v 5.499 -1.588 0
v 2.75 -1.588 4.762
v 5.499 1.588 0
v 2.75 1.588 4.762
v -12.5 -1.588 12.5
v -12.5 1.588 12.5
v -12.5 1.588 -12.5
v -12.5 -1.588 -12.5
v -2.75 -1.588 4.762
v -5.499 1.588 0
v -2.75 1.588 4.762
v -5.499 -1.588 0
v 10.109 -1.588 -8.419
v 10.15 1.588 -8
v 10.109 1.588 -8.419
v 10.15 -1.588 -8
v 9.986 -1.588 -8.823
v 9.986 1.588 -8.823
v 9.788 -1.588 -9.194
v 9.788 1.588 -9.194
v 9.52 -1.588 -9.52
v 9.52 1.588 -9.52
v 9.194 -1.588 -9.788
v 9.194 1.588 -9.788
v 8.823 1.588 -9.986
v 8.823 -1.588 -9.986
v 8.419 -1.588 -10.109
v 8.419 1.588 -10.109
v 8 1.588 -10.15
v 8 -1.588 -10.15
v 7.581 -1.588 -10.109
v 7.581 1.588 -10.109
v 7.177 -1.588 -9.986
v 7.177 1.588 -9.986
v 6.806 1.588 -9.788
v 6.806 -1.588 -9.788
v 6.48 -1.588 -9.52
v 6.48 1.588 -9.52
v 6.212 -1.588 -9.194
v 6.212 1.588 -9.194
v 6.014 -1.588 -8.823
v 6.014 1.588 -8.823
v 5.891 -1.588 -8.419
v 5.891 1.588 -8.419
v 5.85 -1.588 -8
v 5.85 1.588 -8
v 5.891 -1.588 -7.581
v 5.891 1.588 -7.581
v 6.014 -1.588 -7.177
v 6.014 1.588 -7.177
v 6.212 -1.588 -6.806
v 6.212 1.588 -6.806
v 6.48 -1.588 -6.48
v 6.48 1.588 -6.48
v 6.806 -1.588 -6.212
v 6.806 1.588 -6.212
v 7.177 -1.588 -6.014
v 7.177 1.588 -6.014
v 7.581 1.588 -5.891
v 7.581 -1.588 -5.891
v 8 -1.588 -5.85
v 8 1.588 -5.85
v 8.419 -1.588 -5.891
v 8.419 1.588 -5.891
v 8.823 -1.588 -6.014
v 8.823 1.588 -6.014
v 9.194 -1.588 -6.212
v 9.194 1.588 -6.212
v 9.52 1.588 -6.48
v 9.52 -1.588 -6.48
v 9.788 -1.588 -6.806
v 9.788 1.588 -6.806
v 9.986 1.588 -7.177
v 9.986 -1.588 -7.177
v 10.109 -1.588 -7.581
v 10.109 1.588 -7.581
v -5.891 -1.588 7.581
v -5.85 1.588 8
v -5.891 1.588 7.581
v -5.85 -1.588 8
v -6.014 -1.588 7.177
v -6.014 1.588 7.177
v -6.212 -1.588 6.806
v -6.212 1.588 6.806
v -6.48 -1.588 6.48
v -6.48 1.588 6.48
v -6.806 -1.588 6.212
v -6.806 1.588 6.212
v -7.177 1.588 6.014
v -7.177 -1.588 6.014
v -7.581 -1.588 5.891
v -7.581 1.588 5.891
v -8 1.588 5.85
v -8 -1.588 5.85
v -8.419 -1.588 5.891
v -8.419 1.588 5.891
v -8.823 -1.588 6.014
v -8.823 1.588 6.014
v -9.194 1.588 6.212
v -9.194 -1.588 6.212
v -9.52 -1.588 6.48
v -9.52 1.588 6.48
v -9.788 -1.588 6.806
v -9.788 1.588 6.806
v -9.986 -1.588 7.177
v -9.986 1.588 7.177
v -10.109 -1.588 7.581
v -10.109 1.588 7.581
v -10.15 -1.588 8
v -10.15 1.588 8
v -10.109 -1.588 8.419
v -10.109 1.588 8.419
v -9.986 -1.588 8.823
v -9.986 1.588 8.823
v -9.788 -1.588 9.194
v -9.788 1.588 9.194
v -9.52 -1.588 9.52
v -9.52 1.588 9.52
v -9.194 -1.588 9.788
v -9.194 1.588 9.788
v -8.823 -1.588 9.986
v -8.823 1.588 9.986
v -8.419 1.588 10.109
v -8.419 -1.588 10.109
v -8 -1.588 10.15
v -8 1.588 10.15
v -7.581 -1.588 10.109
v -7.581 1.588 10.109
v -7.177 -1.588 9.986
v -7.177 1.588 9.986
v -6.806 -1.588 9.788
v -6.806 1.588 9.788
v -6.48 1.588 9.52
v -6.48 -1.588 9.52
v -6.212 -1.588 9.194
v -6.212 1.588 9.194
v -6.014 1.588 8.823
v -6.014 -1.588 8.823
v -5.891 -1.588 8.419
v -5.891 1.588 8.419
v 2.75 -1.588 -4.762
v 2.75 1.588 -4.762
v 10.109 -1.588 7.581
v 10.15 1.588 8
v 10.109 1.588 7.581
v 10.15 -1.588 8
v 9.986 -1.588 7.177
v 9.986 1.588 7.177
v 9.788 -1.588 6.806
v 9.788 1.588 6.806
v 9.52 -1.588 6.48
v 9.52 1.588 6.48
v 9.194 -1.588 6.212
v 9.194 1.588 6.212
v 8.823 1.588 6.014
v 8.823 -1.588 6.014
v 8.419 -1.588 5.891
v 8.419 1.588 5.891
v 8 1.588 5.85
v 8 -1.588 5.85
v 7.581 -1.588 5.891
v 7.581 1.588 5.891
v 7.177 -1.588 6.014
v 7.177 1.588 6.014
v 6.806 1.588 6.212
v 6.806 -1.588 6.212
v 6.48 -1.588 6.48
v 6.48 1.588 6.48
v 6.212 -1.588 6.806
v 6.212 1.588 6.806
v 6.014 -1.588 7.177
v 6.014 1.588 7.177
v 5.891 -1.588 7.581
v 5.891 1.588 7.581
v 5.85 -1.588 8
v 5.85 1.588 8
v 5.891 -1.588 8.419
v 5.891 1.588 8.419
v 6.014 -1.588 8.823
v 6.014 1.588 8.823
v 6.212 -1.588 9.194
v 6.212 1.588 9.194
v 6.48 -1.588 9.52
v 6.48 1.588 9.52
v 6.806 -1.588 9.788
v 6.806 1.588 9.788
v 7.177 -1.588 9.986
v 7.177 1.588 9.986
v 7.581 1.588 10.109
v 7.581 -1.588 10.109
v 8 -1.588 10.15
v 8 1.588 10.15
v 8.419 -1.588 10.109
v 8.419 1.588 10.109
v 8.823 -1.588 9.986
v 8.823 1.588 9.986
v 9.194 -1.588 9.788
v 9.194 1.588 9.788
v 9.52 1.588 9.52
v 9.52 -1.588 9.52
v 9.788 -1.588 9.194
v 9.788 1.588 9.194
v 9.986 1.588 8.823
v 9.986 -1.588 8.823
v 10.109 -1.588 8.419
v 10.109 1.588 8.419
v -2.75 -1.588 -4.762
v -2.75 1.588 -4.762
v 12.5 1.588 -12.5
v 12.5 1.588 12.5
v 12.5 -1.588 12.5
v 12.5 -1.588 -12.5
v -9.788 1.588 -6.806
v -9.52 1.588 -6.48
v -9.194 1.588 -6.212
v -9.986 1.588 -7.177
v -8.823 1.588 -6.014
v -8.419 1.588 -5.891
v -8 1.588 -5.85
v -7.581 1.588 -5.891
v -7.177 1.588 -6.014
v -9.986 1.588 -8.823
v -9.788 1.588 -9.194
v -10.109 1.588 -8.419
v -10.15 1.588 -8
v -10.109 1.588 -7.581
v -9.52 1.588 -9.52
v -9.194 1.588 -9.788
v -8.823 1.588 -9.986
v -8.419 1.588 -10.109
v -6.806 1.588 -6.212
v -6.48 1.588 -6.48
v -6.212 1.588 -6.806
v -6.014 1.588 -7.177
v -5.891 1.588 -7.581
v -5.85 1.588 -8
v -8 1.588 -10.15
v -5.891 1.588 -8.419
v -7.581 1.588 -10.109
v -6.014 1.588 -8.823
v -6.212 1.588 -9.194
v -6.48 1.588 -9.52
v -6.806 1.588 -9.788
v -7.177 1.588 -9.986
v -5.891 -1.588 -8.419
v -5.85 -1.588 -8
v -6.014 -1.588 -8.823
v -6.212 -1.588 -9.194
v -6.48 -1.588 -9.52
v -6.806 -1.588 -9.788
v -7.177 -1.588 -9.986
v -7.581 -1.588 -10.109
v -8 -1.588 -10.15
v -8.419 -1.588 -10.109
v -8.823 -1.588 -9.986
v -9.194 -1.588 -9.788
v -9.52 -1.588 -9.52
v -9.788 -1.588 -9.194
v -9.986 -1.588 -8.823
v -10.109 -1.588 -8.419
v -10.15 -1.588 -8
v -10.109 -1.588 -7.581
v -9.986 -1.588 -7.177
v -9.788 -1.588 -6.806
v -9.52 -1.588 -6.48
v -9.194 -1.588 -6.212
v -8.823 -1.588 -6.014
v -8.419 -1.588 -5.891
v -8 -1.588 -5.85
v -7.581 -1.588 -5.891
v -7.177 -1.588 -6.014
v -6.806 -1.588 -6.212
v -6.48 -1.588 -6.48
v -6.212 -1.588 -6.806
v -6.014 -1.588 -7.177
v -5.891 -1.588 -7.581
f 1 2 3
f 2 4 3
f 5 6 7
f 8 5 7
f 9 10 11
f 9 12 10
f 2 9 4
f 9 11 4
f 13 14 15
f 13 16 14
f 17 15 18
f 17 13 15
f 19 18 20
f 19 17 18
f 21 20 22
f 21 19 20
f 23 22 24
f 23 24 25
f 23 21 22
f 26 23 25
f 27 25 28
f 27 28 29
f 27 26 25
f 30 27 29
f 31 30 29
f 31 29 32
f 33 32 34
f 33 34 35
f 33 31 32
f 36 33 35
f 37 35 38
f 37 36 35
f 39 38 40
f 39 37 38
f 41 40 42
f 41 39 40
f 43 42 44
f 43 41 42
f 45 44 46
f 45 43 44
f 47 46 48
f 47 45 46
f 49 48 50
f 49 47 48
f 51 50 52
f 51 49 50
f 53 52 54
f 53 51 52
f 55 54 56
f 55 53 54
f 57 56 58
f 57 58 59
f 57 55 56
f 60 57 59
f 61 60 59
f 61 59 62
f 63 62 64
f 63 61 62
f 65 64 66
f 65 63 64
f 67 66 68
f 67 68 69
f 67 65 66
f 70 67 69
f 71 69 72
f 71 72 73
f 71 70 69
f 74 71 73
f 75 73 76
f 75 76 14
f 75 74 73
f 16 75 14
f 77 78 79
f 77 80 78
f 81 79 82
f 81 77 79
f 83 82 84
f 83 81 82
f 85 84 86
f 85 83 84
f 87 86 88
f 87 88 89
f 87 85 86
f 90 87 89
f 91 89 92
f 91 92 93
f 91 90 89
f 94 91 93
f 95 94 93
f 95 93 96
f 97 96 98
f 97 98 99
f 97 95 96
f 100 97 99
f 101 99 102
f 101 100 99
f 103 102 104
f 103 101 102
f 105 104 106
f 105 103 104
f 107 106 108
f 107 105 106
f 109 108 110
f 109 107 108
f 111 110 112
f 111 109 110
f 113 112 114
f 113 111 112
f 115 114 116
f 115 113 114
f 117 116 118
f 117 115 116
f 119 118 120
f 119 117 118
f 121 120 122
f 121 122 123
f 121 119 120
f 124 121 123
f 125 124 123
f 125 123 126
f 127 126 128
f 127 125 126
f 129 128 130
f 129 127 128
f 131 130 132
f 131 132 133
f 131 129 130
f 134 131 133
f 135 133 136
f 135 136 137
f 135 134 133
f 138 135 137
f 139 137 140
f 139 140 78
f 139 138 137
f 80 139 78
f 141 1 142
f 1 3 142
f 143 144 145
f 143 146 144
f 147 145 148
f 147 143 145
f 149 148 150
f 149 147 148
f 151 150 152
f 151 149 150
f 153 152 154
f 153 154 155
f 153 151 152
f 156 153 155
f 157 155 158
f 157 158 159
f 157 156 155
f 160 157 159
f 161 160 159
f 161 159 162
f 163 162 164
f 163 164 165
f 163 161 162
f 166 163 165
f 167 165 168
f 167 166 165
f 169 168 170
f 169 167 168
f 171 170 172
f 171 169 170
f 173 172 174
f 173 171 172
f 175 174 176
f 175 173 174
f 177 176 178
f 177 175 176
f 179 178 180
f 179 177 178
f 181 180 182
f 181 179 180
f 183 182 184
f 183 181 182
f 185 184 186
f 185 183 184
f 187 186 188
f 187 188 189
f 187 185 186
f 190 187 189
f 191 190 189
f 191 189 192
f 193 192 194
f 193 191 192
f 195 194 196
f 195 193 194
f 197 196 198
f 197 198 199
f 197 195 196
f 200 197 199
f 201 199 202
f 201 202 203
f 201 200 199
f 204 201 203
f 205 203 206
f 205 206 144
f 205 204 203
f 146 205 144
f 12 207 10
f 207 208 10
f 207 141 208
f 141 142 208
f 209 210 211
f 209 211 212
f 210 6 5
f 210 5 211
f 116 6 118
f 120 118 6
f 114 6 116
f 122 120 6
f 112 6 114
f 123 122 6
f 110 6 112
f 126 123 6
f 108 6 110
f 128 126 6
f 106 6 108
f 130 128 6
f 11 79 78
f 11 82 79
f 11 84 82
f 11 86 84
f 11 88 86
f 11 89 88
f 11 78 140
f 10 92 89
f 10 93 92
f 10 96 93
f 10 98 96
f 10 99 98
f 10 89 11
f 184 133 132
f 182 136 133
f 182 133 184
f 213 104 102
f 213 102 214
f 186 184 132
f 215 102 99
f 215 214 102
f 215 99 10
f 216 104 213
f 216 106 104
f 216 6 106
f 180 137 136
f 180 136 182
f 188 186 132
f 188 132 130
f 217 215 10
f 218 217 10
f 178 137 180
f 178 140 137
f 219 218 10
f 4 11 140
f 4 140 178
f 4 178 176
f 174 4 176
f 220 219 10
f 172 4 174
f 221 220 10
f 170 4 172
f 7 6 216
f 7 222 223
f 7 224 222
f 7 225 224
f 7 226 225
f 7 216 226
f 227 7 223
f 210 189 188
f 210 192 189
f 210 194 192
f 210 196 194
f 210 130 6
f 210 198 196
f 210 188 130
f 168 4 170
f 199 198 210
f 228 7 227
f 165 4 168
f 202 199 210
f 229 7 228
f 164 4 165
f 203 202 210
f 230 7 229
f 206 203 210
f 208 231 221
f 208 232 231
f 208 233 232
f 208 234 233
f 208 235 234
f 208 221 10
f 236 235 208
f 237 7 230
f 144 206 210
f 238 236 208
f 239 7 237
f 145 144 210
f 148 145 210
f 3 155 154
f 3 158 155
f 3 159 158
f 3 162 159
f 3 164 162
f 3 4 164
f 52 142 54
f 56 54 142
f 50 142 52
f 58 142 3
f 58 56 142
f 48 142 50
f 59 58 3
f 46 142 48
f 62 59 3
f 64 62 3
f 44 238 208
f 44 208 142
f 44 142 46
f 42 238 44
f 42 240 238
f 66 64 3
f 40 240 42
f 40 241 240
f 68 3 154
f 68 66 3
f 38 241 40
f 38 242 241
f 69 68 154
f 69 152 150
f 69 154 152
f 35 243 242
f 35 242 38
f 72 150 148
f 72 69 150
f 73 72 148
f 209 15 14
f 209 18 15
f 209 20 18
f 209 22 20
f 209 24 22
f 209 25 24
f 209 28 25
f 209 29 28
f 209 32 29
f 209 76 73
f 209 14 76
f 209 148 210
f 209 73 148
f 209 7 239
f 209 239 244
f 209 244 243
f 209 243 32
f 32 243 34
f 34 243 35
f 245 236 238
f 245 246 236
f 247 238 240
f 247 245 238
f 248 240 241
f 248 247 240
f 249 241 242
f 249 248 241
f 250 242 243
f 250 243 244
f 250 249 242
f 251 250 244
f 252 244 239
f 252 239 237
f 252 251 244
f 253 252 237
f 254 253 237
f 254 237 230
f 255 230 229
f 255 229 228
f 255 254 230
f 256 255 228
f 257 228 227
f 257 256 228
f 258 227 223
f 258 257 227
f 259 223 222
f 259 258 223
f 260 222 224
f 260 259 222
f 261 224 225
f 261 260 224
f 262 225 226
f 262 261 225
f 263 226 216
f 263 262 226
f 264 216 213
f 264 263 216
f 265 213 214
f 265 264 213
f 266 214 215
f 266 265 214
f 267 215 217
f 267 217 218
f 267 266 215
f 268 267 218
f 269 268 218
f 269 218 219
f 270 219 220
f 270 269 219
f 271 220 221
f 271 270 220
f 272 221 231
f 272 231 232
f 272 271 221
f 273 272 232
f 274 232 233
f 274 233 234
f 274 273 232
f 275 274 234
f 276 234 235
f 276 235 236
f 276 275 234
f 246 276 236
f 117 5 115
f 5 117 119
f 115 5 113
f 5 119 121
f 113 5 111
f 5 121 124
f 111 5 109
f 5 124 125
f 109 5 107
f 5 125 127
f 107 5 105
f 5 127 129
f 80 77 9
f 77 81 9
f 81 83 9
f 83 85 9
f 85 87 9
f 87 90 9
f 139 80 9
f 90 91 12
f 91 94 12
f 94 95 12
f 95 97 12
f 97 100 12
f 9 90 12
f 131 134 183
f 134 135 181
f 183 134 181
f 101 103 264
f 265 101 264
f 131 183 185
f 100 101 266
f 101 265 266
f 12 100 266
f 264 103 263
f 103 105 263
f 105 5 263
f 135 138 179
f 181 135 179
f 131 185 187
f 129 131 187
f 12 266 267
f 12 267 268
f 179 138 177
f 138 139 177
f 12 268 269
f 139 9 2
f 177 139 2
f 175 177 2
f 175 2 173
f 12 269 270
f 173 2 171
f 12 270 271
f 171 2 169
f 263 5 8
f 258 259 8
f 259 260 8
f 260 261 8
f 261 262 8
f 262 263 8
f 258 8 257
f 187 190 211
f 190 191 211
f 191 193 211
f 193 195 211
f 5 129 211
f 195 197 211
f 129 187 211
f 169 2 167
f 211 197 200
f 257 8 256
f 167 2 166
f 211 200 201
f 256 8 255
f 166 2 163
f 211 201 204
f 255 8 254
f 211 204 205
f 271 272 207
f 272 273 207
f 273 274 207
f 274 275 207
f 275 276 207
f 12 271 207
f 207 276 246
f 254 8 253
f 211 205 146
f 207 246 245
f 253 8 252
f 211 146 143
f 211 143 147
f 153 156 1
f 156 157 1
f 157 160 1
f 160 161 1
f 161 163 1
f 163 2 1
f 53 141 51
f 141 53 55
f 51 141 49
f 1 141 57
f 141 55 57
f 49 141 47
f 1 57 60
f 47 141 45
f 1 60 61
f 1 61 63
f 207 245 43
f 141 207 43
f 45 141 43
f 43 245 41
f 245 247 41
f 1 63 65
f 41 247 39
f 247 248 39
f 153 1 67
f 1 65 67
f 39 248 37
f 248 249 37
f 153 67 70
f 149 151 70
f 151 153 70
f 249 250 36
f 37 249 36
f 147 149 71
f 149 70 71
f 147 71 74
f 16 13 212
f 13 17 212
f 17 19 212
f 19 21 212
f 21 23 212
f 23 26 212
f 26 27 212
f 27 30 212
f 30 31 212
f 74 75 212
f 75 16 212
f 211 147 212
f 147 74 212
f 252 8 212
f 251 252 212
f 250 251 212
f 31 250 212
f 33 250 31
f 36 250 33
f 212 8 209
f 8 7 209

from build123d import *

# Parameters (mm, degrees)
SKETCH1_W           = 25
SKETCH1_H           = 25
SKETCH1_R           = 2.15
BOSS_EXTRUDE1_DEPTH = 1.5875


with BuildPart() as part:
    # Sketch1 → Boss-Extrude1 (new body, symmetric)
    with BuildSketch(Plane(origin=(0, 0, 0), x_dir=(1, 0, 0), z_dir=(0, 1, 0))):
        Rectangle(SKETCH1_W, SKETCH1_H)
        with Locations((-8, 8)):
            Circle(SKETCH1_R, mode=Mode.SUBTRACT)
        with Locations((8, 8)):
            Circle(SKETCH1_R, mode=Mode.SUBTRACT)
        with Locations((8, -8)):
            Circle(SKETCH1_R, mode=Mode.SUBTRACT)
        with Locations((-8, -8)):
            Circle(SKETCH1_R, mode=Mode.SUBTRACT)
        Polygon((-2.749630657, -4.7625), (2.749630657, -4.7625), (5.499261314, 0), (2.749630657, 4.7625), (-2.749630657, 4.7625), (-5.499261314, 0), align=None, mode=Mode.SUBTRACT)
    extrude(amount=BOSS_EXTRUDE1_DEPTH, both=True)


solid = part.part
